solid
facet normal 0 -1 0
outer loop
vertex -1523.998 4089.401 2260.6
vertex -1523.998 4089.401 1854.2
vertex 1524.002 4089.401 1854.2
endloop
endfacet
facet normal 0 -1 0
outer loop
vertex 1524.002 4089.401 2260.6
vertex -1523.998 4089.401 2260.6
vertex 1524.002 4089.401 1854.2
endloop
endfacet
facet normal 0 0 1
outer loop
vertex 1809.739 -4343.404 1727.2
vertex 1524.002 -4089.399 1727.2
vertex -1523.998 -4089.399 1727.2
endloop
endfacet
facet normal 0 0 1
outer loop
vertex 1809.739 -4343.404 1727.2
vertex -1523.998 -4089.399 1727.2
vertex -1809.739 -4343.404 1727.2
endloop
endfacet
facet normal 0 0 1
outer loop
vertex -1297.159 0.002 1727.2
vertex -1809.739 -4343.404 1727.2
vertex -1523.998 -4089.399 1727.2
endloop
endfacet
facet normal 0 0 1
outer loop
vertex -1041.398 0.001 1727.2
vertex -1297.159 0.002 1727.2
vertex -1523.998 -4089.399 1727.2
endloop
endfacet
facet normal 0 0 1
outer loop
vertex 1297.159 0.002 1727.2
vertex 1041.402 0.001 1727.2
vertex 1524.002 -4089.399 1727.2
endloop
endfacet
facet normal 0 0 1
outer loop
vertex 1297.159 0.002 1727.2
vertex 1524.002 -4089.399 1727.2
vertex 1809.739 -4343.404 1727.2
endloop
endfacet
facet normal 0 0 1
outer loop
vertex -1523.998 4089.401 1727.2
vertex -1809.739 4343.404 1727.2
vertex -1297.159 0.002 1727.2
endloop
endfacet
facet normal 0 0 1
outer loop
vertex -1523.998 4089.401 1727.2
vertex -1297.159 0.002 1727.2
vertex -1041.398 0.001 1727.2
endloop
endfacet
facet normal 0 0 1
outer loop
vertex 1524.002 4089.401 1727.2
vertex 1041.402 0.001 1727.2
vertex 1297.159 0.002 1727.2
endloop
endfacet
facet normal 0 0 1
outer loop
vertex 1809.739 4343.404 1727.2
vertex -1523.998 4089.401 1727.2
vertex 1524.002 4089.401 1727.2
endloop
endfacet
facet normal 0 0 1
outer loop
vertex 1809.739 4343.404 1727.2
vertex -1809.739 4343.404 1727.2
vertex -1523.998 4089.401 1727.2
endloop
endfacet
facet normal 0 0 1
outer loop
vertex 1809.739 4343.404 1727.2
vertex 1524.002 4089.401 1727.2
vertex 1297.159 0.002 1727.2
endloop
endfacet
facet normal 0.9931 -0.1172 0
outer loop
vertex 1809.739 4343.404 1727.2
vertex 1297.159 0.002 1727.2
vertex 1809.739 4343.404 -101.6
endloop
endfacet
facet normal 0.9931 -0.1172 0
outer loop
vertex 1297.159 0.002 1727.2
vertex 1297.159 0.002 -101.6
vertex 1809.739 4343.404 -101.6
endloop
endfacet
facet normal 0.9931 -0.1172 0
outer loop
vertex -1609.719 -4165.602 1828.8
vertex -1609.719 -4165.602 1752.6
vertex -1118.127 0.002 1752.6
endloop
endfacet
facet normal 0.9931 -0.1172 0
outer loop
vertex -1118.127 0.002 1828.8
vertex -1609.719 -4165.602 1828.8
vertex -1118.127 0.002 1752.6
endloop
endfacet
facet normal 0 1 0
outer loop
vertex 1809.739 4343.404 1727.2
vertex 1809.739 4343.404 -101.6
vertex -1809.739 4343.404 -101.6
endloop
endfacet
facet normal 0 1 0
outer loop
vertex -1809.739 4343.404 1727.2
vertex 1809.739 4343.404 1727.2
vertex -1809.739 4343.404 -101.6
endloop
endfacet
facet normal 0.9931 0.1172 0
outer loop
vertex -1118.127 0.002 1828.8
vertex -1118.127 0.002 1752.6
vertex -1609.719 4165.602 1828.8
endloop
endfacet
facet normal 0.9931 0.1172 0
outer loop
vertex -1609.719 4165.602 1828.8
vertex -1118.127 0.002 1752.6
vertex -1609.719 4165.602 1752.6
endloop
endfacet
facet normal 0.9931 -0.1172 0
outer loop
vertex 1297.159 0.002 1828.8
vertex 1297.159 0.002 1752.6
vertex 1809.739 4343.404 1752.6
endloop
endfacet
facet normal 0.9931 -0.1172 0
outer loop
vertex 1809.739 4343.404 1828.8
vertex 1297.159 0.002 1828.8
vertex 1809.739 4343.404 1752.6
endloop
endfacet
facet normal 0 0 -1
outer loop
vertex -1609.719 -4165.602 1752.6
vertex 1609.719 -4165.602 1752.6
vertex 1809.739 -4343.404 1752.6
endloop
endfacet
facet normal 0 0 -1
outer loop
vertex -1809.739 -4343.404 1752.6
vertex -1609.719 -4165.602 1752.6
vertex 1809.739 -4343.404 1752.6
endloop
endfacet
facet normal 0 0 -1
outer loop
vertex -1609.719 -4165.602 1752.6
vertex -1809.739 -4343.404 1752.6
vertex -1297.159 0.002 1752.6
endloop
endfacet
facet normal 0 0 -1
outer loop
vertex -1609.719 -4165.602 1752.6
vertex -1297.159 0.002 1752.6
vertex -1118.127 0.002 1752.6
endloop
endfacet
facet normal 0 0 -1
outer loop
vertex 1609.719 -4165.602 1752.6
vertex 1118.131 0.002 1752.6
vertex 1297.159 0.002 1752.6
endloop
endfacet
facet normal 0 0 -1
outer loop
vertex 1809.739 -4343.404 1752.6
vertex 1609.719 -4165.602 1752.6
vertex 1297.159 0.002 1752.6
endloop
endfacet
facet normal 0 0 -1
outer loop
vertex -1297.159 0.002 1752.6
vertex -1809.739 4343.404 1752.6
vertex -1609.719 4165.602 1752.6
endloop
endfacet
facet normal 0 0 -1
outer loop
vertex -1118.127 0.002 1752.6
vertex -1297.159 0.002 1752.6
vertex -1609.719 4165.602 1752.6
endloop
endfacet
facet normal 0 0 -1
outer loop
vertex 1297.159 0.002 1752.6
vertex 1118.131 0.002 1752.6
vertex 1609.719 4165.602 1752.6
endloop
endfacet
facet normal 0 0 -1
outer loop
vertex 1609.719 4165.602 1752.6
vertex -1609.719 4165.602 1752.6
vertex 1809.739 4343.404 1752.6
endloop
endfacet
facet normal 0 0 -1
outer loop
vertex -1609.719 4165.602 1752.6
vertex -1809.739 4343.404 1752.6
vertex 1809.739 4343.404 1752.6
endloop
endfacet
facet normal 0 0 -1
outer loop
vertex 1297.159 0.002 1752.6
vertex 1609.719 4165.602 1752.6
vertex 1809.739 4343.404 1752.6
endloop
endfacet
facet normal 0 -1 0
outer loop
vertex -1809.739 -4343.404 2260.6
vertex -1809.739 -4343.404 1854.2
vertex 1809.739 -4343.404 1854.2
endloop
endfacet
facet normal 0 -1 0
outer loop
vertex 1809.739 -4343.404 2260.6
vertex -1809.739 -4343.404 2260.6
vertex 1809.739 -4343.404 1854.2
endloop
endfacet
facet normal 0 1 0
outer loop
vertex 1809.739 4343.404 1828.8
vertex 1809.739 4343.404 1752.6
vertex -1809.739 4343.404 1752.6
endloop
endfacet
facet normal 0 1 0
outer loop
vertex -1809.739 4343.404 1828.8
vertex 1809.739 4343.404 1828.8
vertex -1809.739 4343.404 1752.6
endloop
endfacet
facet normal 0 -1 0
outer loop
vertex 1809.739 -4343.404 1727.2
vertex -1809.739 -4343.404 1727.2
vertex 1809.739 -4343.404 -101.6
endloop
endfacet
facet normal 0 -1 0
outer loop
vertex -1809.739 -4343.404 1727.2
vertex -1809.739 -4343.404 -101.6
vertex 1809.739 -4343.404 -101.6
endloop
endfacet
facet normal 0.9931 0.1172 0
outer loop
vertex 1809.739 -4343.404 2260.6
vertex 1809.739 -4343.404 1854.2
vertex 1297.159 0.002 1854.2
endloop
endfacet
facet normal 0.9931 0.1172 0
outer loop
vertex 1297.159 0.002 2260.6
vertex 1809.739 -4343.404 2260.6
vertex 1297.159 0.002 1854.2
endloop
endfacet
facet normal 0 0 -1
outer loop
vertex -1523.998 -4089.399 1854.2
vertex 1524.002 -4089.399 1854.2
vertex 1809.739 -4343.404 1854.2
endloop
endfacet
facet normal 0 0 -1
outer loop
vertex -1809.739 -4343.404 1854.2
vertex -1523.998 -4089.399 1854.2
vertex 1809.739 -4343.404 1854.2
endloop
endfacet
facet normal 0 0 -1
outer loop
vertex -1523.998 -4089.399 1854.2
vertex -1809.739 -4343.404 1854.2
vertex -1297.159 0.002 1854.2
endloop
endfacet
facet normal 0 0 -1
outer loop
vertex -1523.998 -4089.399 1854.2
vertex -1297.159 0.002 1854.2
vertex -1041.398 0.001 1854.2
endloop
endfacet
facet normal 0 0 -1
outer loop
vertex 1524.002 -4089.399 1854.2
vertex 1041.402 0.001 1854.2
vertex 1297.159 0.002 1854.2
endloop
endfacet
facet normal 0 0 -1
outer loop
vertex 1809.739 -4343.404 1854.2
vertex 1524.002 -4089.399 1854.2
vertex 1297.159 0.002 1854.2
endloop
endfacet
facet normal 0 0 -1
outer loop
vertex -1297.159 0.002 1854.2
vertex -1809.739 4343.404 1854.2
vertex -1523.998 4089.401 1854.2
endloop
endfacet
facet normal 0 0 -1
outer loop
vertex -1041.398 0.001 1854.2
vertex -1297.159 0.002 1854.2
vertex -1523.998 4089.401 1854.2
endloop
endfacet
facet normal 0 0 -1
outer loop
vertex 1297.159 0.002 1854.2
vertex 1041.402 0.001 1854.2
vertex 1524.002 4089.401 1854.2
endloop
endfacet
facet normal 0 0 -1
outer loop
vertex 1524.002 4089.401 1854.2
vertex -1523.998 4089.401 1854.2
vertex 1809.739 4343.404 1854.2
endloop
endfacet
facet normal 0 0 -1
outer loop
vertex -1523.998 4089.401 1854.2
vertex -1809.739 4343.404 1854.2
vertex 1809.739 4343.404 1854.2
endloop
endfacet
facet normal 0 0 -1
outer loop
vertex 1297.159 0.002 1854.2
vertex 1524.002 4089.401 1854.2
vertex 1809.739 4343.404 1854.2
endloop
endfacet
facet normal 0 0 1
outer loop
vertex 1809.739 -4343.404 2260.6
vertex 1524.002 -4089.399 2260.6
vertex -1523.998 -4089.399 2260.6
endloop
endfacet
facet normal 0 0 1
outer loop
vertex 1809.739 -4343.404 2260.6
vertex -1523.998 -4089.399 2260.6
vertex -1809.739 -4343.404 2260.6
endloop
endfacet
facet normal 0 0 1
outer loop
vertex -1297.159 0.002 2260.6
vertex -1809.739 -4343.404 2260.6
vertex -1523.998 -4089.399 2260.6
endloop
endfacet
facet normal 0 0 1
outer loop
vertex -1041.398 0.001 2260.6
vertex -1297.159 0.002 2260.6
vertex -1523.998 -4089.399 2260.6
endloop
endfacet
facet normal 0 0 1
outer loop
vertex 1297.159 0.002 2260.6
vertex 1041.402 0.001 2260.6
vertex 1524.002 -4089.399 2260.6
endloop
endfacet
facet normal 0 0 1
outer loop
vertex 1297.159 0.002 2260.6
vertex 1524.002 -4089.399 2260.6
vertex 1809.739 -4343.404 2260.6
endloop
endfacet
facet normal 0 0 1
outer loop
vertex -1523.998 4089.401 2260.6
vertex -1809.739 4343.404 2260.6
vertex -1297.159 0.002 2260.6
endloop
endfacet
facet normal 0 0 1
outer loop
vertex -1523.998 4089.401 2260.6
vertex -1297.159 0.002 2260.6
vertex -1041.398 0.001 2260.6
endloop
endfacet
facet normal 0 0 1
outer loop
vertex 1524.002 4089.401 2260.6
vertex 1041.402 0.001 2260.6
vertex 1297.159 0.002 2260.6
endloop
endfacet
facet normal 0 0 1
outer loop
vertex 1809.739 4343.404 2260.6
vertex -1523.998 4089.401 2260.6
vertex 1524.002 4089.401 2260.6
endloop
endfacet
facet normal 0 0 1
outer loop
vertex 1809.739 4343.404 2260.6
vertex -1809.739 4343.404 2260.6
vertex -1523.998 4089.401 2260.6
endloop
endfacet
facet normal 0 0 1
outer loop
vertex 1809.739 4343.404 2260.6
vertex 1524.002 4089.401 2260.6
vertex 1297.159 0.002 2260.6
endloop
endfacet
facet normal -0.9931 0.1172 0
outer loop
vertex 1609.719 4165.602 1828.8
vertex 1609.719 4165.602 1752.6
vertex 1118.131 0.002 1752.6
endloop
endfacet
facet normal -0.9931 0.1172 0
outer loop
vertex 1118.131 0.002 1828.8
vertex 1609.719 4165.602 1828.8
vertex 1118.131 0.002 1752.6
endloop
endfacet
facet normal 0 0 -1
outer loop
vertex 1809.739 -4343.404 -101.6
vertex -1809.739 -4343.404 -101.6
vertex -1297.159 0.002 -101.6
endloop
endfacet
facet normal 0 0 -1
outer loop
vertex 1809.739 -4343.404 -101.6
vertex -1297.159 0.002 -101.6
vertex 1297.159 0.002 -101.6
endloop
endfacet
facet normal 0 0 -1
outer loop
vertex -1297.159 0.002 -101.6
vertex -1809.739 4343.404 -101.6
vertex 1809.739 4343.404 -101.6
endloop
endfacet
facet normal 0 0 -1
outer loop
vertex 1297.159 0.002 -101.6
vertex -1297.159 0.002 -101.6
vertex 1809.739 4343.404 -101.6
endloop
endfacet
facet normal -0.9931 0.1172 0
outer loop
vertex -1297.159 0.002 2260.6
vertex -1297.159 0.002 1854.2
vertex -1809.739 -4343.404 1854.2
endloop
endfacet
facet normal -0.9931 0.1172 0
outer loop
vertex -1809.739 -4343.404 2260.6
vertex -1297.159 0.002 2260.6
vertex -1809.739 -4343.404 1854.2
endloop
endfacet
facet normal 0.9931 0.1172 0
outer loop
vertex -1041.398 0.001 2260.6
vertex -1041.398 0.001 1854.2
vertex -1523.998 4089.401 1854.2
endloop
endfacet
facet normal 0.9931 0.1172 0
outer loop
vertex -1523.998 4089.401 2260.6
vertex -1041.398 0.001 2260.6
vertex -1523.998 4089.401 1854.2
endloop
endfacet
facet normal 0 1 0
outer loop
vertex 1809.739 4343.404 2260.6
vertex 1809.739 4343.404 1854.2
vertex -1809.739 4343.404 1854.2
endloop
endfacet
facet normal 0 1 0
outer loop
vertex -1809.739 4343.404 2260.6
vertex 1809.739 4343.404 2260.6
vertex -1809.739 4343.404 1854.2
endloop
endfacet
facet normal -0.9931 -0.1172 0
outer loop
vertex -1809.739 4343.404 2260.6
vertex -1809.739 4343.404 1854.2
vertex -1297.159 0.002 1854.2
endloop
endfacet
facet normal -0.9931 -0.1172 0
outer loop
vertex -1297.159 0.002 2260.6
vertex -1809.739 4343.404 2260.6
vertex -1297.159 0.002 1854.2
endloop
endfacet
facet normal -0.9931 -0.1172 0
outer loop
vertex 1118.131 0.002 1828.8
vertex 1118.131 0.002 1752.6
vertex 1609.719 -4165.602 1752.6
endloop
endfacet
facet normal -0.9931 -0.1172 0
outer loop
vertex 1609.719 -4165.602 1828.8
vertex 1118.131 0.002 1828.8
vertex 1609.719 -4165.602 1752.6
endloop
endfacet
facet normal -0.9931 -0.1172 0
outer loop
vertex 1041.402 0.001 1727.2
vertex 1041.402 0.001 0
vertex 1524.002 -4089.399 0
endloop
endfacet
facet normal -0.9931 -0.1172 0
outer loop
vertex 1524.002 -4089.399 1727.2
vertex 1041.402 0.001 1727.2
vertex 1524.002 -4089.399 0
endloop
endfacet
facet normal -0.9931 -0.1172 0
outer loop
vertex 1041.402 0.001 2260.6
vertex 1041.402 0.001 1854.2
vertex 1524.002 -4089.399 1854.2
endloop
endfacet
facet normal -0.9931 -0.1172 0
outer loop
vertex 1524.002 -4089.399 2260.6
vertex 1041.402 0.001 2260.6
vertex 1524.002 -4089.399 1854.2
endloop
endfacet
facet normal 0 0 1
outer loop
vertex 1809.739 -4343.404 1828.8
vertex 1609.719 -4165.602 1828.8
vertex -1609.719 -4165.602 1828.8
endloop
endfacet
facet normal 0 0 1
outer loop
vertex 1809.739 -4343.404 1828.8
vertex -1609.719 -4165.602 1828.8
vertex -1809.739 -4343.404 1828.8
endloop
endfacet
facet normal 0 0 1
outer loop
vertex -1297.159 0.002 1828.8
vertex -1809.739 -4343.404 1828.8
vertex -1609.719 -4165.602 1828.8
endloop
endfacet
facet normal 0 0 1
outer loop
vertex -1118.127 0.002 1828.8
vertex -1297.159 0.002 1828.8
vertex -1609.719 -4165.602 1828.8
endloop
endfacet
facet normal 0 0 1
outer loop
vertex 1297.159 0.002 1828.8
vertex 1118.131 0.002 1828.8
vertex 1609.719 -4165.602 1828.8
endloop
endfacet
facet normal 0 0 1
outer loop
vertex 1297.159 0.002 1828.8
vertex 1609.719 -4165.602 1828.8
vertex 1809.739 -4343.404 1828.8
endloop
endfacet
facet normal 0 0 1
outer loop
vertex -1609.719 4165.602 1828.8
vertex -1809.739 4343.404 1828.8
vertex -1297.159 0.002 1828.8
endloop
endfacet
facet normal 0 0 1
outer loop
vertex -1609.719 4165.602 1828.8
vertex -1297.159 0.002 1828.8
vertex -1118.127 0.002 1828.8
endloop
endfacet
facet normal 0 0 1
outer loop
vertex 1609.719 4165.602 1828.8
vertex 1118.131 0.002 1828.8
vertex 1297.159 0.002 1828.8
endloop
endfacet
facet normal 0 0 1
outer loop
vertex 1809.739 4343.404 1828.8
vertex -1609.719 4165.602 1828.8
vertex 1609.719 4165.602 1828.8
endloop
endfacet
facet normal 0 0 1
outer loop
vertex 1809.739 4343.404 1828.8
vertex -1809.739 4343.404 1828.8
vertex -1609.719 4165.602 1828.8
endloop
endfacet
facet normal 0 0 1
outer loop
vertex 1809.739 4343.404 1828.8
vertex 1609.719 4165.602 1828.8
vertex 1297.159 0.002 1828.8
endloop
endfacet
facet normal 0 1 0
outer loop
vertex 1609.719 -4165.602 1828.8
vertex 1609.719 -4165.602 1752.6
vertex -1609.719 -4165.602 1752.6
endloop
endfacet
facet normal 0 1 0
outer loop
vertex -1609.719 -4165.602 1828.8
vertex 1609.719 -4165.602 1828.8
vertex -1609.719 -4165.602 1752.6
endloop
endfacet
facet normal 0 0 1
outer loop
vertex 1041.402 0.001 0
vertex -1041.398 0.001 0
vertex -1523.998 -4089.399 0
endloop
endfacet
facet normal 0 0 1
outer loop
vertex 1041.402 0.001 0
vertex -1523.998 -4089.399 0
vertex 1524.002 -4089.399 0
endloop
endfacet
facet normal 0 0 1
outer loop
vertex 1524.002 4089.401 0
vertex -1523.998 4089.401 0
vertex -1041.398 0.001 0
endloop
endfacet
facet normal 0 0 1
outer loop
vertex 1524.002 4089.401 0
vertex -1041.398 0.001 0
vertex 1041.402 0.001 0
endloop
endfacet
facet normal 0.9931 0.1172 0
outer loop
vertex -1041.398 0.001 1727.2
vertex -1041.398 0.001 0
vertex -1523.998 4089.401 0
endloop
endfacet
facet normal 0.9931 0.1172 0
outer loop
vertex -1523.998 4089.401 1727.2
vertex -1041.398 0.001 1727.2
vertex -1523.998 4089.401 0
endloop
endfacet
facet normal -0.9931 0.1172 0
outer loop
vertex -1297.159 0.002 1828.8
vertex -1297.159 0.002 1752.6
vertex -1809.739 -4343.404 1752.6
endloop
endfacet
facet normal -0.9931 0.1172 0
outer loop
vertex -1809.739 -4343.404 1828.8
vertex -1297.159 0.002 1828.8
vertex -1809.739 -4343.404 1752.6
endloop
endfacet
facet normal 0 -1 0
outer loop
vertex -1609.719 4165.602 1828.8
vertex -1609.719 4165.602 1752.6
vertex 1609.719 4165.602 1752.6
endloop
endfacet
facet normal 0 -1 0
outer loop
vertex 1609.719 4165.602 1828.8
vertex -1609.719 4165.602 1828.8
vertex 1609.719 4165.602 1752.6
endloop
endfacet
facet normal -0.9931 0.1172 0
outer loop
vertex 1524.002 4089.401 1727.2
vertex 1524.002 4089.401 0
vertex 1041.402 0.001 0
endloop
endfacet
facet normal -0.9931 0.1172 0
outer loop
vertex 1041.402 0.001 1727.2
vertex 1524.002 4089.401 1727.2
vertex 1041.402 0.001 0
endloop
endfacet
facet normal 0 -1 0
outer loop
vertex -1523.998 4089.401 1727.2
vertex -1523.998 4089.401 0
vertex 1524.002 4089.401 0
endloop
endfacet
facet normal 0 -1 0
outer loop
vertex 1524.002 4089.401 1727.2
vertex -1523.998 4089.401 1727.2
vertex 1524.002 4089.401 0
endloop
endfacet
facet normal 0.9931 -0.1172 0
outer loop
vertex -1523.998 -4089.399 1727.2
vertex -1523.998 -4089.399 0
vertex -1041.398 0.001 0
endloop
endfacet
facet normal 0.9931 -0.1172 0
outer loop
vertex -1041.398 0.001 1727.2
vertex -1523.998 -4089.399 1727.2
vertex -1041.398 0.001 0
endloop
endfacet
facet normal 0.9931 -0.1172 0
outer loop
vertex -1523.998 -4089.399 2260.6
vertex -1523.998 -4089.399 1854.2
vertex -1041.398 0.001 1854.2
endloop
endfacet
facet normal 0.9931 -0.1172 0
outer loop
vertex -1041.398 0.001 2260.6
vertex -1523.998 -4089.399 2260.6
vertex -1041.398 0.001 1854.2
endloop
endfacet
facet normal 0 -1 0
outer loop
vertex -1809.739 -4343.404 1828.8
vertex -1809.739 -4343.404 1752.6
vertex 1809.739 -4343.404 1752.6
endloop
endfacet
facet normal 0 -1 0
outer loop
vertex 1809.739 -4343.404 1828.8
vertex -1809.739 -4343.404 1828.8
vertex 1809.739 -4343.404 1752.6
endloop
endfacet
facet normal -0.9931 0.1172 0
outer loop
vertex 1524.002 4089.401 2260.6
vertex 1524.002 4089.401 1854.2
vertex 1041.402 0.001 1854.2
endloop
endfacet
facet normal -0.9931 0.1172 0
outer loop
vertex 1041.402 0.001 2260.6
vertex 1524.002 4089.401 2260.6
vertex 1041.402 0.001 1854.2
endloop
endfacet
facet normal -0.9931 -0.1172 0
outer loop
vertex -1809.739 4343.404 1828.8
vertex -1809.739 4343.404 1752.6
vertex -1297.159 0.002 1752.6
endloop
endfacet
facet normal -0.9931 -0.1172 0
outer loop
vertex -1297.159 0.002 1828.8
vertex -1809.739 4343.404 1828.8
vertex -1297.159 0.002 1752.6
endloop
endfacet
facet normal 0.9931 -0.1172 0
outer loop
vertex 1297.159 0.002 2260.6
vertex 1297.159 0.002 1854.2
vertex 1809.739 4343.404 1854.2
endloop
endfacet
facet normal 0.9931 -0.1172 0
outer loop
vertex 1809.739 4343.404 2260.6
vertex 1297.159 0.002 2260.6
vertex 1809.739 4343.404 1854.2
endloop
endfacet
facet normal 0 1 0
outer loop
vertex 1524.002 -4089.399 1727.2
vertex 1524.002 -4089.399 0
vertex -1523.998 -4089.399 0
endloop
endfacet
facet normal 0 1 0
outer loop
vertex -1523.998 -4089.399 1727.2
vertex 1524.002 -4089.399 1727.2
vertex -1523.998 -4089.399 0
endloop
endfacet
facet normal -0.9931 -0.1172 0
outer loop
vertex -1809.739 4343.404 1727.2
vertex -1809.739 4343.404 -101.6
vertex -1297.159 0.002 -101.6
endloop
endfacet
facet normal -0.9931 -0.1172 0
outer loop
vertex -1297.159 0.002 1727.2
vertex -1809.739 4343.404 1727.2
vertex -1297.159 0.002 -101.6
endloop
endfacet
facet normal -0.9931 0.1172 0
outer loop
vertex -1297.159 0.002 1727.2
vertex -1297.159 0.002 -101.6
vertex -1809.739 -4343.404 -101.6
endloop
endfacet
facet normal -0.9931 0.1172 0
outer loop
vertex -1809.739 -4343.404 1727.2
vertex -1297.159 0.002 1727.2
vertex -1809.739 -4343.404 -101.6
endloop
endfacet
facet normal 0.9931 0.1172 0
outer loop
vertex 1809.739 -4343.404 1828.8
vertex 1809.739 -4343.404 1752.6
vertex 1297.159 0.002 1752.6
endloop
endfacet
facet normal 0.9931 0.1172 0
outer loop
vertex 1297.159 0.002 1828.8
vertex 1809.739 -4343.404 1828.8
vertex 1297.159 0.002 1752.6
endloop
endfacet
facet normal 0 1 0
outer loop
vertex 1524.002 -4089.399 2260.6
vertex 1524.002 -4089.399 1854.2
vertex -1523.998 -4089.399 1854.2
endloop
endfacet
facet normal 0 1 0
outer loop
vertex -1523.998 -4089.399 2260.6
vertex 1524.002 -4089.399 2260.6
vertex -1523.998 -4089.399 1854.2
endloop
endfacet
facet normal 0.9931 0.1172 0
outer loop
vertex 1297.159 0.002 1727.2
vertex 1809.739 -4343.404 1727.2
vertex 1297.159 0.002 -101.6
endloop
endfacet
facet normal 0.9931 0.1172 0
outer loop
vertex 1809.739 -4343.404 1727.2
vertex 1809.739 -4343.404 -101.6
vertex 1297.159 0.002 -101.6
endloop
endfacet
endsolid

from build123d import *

# Parameters (mm, degrees)
F1_DEPTH = 101.6
F2_DEPTH = 1727.2
F5_DEPTH = 76.2
F8_DEPTH = 406.4


with BuildPart() as f1:
    # F0 (on Top) → F1 (new body)
    with BuildSketch(Plane.XY):
        Polygon((-1297.1585436, 0.0021844), (-1809.739078, -4343.4039624), (1809.739078, -4343.4039624), (1297.158569, 0.0021844), (1809.739078, 4343.4039878), (-1809.739078, 4343.4039878), align=None)
        Polygon((-1041.3984252, 0.0007366), (-1523.9984252, 4089.4007366), (1524.0015748, 4089.4007366), (1041.4015748, 0.0007366), (1524.0015748, -4089.3992634), (-1523.9984252, -4089.3992634), align=None, mode=Mode.SUBTRACT)
        Polygon((1524.0015748, 4089.4007366), (-1523.9984252, 4089.4007366), (-1041.3984252, 0.0007366), (-1523.9984252, -4089.3992634), (1524.0015748, -4089.3992634), (1041.4015748, 0.0007366), align=None)
    extrude(amount=-F1_DEPTH)

    # F0 (on Top) → F2 (join)
    with BuildSketch(Plane.XY):
        Polygon((-1297.1585436, 0.0021844), (-1809.739078, -4343.4039624), (1809.739078, -4343.4039624), (1297.158569, 0.0021844), (1809.739078, 4343.4039878), (-1809.739078, 4343.4039878), align=None)
        Polygon((-1041.3984252, 0.0007366), (-1523.9984252, 4089.4007366), (1524.0015748, 4089.4007366), (1041.4015748, 0.0007366), (1524.0015748, -4089.3992634), (-1523.9984252, -4089.3992634), align=None, mode=Mode.SUBTRACT)
    extrude(amount=F2_DEPTH)


with BuildPart() as f5:
    # F4 (on offset) → F5 (new body)
    with BuildSketch(Plane.XY.offset(1752.6)):
        Polygon((-1297.1585436, 0.0021844), (-1809.739078, -4343.4039624), (1809.739078, -4343.4039624), (1297.158569, 0.0021844), (1809.739078, 4343.4039878), (-1809.739078, 4343.4039878), align=None)
        Polygon((1609.7191834, -4165.6017018), (-1609.719158, -4165.6017018), (-1118.1268214, 0.0021844), (-1609.719158, 4165.6017018), (1609.7191834, 4165.6017018), (1118.1312156, 0.0021844), align=None, mode=Mode.SUBTRACT)
    extrude(amount=F5_DEPTH)


with BuildPart() as f8:
    # F7 (on offset) → F8 (new body)
    with BuildSketch(Plane.XY.offset(1854.2)):
        Polygon((-1297.1585436, 0.0021844), (-1809.739078, -4343.4039624), (1809.739078, -4343.4039624), (1297.158569, 0.0021844), (1809.739078, 4343.4039878), (-1809.739078, 4343.4039878), align=None)
        Polygon((-1041.3984252, 0.0007366), (-1523.9984252, 4089.4007366), (1524.0015748, 4089.4007366), (1041.4015748, 0.0007366), (1524.0015748, -4089.3992634), (-1523.9984252, -4089.3992634), align=None, mode=Mode.SUBTRACT)
    extrude(amount=F8_DEPTH)


solid = Compound([f1.part, f5.part, f8.part])
